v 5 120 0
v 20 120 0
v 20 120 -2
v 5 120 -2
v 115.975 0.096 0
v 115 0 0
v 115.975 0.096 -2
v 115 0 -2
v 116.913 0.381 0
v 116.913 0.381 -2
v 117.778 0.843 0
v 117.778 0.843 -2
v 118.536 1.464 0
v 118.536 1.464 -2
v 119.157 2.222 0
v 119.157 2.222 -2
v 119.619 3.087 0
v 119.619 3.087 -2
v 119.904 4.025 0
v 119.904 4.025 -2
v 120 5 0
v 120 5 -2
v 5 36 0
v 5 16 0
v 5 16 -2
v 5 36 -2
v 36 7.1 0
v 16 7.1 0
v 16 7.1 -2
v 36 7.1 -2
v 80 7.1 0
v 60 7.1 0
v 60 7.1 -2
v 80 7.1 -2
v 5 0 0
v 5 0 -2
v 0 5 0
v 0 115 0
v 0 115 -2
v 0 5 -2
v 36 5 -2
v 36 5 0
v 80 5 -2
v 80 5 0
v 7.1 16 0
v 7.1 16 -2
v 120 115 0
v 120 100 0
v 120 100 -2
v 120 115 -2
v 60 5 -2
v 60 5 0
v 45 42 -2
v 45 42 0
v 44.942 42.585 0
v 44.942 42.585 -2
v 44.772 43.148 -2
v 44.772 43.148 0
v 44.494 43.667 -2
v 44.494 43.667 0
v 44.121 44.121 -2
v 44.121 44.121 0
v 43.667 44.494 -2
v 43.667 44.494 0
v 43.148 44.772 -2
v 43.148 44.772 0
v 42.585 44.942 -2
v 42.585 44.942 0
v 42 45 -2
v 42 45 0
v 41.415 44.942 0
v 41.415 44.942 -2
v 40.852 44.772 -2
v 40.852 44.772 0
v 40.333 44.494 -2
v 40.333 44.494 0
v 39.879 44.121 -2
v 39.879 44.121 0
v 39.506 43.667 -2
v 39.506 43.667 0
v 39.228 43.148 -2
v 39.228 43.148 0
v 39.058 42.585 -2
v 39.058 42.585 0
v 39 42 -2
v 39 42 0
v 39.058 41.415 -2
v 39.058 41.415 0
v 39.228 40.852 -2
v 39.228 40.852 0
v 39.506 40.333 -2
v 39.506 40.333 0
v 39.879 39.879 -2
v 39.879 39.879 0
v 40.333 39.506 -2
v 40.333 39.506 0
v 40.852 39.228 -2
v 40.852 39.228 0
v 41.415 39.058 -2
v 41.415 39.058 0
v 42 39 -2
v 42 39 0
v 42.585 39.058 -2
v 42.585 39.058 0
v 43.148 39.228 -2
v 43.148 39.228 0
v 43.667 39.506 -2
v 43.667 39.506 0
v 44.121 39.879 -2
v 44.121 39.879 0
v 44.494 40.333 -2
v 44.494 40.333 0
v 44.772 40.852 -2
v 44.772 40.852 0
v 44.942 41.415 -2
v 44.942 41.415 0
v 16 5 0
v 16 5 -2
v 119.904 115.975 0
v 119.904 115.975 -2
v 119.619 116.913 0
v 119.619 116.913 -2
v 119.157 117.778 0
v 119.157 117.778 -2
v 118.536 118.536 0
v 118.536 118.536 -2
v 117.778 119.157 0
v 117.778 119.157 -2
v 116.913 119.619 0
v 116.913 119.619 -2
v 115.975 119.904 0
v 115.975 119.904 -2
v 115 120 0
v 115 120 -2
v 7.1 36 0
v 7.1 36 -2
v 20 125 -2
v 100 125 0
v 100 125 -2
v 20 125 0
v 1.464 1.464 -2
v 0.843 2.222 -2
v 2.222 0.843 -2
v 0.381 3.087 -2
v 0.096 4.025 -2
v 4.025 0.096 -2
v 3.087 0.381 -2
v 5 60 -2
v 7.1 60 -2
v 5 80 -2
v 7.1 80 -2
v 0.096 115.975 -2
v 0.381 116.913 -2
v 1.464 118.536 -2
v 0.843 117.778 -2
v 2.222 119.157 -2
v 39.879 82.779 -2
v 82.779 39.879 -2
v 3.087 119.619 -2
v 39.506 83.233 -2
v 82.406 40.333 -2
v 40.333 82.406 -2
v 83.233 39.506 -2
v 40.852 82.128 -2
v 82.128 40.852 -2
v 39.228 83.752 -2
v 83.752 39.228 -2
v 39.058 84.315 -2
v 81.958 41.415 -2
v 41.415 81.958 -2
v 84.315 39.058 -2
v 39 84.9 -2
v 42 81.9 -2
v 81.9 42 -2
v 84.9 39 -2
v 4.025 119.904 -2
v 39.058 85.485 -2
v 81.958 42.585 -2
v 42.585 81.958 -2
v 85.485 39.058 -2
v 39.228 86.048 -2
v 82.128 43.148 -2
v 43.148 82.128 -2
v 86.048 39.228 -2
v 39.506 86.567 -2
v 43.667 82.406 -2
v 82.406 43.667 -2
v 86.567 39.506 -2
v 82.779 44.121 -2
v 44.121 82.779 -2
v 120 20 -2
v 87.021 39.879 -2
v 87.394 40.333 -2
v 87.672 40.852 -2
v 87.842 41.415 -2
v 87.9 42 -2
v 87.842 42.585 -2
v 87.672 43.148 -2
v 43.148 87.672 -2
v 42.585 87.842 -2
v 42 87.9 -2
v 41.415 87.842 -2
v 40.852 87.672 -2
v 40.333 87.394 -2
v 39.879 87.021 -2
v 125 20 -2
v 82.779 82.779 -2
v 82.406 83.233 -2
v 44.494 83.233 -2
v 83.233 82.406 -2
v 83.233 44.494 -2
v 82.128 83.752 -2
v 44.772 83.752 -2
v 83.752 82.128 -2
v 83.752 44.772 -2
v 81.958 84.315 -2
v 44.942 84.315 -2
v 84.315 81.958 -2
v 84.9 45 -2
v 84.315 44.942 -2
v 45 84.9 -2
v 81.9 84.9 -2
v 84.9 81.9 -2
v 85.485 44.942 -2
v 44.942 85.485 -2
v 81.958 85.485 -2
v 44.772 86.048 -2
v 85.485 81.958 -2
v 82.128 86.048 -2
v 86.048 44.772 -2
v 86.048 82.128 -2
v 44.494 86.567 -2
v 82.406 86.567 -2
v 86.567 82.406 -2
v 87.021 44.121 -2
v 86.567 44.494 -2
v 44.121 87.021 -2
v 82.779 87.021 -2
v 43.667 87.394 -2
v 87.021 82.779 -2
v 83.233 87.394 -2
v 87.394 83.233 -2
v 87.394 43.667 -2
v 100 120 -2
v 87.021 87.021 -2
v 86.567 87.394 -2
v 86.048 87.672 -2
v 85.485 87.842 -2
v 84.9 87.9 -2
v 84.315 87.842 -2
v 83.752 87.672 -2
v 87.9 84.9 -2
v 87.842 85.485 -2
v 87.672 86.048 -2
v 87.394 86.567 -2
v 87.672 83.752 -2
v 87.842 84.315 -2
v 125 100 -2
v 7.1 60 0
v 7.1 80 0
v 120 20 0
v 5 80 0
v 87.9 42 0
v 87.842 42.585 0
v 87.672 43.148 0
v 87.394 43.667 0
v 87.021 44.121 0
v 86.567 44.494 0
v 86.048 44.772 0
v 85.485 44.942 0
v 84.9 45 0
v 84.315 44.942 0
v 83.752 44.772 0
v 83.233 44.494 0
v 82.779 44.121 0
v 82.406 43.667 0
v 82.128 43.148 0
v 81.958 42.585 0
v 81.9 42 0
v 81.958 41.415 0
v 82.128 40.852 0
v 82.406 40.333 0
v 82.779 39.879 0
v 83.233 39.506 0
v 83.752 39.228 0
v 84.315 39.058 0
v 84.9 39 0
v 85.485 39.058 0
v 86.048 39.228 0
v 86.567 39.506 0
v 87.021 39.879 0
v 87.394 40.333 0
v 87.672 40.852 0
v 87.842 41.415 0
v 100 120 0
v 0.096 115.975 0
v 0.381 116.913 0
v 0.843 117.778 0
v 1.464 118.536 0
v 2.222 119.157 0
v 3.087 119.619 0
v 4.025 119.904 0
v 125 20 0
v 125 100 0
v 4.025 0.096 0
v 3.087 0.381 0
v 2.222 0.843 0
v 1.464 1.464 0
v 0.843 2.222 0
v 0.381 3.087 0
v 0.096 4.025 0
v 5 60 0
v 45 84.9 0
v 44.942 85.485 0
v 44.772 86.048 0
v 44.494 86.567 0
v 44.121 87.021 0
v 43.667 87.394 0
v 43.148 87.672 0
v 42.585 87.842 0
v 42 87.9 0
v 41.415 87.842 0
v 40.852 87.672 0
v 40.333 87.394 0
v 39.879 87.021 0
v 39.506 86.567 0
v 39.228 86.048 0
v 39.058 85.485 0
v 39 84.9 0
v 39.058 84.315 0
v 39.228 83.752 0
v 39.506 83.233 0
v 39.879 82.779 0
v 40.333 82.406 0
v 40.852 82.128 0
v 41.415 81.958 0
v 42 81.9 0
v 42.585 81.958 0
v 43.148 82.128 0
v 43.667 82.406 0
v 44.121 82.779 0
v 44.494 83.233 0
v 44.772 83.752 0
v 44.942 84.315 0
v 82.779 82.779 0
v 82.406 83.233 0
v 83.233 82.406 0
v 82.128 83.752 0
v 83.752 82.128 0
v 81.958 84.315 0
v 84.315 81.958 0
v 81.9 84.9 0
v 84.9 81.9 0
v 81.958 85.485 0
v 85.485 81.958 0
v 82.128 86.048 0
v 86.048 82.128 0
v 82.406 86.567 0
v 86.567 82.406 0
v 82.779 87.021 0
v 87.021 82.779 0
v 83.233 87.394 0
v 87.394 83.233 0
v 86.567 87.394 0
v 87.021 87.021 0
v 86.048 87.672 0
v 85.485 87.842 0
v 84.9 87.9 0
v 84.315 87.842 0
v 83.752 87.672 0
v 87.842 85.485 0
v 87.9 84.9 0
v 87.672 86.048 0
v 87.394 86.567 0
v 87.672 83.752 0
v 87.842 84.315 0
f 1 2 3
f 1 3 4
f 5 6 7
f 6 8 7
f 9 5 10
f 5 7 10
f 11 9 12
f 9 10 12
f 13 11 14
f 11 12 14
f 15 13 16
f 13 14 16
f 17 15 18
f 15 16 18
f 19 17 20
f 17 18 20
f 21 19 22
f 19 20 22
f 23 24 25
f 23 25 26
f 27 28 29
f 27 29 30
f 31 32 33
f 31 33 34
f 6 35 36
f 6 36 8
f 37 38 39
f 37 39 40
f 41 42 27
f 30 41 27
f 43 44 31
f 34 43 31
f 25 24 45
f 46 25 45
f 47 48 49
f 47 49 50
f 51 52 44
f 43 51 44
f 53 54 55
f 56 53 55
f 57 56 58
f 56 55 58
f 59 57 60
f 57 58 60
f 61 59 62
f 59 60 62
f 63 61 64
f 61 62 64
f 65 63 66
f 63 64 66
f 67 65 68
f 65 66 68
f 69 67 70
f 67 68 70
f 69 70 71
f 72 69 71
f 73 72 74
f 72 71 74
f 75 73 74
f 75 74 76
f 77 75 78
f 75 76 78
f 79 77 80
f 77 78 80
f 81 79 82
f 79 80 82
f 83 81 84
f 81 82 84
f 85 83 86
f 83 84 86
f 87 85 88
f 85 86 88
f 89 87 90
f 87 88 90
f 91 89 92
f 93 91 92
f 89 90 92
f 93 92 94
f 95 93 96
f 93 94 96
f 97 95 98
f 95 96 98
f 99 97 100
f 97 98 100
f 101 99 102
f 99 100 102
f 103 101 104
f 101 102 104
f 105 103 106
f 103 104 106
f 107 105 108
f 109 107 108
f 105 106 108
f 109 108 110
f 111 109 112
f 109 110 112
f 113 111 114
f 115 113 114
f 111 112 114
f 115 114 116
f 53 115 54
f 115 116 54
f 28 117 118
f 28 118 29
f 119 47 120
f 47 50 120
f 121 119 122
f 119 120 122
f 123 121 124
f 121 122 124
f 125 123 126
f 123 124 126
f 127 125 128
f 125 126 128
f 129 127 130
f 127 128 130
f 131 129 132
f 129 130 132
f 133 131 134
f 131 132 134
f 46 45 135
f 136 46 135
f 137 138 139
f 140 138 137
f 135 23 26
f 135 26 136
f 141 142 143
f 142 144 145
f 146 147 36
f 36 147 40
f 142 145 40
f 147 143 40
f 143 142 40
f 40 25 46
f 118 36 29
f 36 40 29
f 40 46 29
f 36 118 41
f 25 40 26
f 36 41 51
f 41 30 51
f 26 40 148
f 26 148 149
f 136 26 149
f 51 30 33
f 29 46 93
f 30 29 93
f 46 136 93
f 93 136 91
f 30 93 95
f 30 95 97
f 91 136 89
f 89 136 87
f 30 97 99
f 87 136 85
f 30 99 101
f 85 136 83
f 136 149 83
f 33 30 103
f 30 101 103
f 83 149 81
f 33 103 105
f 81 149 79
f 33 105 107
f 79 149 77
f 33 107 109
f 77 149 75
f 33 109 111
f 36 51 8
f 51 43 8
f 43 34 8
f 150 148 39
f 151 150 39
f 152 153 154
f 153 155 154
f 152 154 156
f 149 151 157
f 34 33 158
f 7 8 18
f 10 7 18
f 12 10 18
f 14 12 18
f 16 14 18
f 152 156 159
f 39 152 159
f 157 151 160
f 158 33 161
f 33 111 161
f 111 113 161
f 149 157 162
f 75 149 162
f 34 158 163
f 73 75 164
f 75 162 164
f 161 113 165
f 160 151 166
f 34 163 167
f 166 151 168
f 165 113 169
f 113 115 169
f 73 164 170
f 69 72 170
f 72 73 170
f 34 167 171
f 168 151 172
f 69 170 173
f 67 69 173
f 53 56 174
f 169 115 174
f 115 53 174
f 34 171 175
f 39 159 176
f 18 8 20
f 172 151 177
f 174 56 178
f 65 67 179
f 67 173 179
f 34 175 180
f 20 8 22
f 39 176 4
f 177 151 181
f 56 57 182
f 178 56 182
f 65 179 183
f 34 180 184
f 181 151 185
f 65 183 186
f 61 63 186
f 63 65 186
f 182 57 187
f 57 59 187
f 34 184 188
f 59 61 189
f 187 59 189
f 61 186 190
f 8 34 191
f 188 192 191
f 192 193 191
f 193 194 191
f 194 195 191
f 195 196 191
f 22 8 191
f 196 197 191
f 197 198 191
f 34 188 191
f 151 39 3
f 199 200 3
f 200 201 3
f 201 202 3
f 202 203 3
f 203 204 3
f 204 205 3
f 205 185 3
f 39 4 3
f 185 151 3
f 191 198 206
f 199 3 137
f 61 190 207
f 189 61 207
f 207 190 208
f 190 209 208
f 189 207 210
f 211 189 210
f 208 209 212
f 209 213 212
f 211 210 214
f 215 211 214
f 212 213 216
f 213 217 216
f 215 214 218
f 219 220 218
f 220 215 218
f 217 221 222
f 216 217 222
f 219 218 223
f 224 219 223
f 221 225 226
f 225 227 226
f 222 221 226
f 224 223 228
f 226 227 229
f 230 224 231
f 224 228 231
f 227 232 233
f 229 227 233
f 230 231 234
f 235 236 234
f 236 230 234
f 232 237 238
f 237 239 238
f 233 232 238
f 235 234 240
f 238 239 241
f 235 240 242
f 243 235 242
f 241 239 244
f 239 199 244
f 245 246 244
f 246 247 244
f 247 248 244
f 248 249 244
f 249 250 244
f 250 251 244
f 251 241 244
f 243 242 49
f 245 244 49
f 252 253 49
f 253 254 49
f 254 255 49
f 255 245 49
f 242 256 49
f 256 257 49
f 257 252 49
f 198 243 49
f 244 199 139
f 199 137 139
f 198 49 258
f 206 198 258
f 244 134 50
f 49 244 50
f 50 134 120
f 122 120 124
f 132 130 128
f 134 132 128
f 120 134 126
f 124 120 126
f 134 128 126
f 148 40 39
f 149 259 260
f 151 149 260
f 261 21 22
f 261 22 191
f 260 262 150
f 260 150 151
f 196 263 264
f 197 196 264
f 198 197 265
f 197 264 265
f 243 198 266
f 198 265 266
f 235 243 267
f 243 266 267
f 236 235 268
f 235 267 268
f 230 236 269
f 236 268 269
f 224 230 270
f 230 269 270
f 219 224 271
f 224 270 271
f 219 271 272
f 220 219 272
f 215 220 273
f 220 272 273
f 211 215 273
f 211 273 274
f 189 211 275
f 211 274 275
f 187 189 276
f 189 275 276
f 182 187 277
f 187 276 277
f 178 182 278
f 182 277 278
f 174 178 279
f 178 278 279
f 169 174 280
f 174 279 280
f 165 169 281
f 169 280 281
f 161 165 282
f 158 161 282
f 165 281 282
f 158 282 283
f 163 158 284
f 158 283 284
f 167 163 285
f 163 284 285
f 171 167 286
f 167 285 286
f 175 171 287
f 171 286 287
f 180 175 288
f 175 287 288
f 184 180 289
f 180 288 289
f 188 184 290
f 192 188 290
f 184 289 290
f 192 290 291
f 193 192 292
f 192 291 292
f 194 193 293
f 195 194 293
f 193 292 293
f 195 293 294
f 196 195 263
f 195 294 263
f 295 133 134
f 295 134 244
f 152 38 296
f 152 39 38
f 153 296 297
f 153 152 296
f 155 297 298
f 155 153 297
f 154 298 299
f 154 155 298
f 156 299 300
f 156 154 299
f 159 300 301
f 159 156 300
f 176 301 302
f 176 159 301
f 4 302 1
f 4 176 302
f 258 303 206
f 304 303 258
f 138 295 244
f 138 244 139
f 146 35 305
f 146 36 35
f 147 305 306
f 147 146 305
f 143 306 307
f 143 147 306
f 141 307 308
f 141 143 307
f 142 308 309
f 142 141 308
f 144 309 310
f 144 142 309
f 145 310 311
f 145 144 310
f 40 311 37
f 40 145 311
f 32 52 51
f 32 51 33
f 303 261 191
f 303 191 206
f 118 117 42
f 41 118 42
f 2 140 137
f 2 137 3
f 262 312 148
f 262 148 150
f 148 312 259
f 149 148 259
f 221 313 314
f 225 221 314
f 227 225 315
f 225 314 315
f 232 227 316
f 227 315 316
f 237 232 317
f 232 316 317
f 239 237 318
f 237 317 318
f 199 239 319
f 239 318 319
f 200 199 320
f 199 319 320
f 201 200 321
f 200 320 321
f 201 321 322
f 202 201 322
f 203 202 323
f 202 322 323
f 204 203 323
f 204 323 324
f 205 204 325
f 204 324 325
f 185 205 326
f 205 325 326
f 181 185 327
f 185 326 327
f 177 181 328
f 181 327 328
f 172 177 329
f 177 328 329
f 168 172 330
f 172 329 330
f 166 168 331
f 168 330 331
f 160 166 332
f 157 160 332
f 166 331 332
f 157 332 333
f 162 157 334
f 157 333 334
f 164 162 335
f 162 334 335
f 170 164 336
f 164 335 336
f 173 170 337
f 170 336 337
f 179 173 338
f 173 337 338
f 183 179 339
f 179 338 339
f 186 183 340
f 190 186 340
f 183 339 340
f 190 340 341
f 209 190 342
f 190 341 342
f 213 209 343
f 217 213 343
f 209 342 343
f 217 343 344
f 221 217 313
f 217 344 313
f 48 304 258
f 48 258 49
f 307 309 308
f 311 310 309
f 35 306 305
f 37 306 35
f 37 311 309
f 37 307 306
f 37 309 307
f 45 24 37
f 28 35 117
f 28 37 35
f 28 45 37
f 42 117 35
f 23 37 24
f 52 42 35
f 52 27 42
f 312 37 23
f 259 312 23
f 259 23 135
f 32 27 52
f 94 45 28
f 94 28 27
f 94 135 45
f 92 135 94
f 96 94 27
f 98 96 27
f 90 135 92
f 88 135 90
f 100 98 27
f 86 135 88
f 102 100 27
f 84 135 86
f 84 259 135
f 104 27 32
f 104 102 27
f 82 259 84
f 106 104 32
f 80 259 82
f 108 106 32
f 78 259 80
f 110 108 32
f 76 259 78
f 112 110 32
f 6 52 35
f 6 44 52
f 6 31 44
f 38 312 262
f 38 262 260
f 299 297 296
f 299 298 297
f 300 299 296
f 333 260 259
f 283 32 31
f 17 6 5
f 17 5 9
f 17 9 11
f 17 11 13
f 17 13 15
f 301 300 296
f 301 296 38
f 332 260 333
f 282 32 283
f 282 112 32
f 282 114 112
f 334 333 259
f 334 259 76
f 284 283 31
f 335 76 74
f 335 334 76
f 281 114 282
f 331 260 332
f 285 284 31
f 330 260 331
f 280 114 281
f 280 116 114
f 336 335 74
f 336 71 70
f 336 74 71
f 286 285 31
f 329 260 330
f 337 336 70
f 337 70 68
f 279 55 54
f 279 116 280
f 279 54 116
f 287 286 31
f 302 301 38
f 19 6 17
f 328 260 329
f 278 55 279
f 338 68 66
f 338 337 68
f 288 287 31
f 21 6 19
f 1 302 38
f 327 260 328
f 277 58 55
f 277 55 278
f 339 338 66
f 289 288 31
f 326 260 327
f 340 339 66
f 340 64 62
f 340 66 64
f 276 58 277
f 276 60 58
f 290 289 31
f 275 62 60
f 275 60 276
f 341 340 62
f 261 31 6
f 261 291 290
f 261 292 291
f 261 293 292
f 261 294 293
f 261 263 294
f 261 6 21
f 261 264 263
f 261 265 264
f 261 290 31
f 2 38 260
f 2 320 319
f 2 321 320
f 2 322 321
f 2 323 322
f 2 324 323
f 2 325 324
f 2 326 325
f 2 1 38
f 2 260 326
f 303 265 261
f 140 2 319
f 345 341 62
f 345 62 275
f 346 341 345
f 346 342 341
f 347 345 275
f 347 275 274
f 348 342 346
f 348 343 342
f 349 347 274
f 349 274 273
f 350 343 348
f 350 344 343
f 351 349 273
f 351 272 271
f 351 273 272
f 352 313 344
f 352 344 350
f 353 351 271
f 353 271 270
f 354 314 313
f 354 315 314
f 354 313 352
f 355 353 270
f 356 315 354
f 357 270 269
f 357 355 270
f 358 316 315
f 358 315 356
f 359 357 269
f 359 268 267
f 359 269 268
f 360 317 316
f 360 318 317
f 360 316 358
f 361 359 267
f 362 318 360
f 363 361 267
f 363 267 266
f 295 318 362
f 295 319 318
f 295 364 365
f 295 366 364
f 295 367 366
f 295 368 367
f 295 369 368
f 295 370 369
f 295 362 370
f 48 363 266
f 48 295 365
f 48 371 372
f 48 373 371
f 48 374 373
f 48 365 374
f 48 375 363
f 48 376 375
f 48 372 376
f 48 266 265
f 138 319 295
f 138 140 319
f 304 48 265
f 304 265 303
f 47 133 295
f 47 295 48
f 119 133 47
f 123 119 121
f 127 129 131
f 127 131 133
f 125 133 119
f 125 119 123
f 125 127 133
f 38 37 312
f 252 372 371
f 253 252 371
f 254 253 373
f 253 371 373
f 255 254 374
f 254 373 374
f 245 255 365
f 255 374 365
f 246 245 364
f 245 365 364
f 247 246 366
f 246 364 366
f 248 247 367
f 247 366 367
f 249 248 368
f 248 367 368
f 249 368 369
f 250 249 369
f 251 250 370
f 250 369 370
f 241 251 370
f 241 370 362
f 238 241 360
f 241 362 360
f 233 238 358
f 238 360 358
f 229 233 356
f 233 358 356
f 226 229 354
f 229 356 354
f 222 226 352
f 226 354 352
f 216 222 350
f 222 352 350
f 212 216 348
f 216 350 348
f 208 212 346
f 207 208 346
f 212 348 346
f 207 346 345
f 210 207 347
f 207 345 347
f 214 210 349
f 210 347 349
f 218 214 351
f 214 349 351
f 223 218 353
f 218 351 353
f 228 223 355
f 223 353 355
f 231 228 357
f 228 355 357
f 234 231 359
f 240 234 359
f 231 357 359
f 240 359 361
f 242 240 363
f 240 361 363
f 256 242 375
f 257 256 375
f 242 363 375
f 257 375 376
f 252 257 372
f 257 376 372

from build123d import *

# Parameters (mm, degrees)
SKETCH1_R          = 3
SKETCH1_W          = 20
SKETCH1_H          = 2.1
SKETCH1_W_2        = 2.1
SKETCH1_H_2        = 20
BASE_FLANGE1_DEPTH = 2
FILLET1_R          = 5


# Sheet-metal steps are written as plain solids
with BuildPart() as part:
    # Sketch1 → Base-Flange1 (new body)
    with BuildSketch(Plane.XY):
        Polygon((0, 0), (120, 0), (120, 20), (125, 20), (125, 100), (120, 100), (120, 120), (100, 120), (100, 125), (20, 125), (20, 120), (0, 120), align=None)
        with Locations((42, 42)):
            Circle(SKETCH1_R, mode=Mode.SUBTRACT)
        with Locations((84.9, 42)):
            Circle(SKETCH1_R, mode=Mode.SUBTRACT)
        with Locations((42, 84.9)):
            Circle(SKETCH1_R, mode=Mode.SUBTRACT)
        with Locations((84.9, 84.9)):
            Circle(SKETCH1_R, mode=Mode.SUBTRACT)
        with Locations((26, 6.05)):
            Rectangle(SKETCH1_W, SKETCH1_H, mode=Mode.SUBTRACT)
        with Locations((70, 6.05)):
            Rectangle(SKETCH1_W, SKETCH1_H, mode=Mode.SUBTRACT)
        with Locations((6.05, 26)):
            Rectangle(SKETCH1_W_2, SKETCH1_H_2, mode=Mode.SUBTRACT)
        with Locations((6.05, 70)):
            Rectangle(SKETCH1_W_2, SKETCH1_H_2, mode=Mode.SUBTRACT)
    extrude(amount=-BASE_FLANGE1_DEPTH)

    # Fillet1
    fillet1_edges = [part.edges().sort_by_distance(p)[0] for p in [
        (0, 120, -1),
        (120, 120, -1),
        (120, 0, -1),
        (0, 0, -1),
    ]]
    fillet(fillet1_edges, radius=FILLET1_R)


solid = part.part
